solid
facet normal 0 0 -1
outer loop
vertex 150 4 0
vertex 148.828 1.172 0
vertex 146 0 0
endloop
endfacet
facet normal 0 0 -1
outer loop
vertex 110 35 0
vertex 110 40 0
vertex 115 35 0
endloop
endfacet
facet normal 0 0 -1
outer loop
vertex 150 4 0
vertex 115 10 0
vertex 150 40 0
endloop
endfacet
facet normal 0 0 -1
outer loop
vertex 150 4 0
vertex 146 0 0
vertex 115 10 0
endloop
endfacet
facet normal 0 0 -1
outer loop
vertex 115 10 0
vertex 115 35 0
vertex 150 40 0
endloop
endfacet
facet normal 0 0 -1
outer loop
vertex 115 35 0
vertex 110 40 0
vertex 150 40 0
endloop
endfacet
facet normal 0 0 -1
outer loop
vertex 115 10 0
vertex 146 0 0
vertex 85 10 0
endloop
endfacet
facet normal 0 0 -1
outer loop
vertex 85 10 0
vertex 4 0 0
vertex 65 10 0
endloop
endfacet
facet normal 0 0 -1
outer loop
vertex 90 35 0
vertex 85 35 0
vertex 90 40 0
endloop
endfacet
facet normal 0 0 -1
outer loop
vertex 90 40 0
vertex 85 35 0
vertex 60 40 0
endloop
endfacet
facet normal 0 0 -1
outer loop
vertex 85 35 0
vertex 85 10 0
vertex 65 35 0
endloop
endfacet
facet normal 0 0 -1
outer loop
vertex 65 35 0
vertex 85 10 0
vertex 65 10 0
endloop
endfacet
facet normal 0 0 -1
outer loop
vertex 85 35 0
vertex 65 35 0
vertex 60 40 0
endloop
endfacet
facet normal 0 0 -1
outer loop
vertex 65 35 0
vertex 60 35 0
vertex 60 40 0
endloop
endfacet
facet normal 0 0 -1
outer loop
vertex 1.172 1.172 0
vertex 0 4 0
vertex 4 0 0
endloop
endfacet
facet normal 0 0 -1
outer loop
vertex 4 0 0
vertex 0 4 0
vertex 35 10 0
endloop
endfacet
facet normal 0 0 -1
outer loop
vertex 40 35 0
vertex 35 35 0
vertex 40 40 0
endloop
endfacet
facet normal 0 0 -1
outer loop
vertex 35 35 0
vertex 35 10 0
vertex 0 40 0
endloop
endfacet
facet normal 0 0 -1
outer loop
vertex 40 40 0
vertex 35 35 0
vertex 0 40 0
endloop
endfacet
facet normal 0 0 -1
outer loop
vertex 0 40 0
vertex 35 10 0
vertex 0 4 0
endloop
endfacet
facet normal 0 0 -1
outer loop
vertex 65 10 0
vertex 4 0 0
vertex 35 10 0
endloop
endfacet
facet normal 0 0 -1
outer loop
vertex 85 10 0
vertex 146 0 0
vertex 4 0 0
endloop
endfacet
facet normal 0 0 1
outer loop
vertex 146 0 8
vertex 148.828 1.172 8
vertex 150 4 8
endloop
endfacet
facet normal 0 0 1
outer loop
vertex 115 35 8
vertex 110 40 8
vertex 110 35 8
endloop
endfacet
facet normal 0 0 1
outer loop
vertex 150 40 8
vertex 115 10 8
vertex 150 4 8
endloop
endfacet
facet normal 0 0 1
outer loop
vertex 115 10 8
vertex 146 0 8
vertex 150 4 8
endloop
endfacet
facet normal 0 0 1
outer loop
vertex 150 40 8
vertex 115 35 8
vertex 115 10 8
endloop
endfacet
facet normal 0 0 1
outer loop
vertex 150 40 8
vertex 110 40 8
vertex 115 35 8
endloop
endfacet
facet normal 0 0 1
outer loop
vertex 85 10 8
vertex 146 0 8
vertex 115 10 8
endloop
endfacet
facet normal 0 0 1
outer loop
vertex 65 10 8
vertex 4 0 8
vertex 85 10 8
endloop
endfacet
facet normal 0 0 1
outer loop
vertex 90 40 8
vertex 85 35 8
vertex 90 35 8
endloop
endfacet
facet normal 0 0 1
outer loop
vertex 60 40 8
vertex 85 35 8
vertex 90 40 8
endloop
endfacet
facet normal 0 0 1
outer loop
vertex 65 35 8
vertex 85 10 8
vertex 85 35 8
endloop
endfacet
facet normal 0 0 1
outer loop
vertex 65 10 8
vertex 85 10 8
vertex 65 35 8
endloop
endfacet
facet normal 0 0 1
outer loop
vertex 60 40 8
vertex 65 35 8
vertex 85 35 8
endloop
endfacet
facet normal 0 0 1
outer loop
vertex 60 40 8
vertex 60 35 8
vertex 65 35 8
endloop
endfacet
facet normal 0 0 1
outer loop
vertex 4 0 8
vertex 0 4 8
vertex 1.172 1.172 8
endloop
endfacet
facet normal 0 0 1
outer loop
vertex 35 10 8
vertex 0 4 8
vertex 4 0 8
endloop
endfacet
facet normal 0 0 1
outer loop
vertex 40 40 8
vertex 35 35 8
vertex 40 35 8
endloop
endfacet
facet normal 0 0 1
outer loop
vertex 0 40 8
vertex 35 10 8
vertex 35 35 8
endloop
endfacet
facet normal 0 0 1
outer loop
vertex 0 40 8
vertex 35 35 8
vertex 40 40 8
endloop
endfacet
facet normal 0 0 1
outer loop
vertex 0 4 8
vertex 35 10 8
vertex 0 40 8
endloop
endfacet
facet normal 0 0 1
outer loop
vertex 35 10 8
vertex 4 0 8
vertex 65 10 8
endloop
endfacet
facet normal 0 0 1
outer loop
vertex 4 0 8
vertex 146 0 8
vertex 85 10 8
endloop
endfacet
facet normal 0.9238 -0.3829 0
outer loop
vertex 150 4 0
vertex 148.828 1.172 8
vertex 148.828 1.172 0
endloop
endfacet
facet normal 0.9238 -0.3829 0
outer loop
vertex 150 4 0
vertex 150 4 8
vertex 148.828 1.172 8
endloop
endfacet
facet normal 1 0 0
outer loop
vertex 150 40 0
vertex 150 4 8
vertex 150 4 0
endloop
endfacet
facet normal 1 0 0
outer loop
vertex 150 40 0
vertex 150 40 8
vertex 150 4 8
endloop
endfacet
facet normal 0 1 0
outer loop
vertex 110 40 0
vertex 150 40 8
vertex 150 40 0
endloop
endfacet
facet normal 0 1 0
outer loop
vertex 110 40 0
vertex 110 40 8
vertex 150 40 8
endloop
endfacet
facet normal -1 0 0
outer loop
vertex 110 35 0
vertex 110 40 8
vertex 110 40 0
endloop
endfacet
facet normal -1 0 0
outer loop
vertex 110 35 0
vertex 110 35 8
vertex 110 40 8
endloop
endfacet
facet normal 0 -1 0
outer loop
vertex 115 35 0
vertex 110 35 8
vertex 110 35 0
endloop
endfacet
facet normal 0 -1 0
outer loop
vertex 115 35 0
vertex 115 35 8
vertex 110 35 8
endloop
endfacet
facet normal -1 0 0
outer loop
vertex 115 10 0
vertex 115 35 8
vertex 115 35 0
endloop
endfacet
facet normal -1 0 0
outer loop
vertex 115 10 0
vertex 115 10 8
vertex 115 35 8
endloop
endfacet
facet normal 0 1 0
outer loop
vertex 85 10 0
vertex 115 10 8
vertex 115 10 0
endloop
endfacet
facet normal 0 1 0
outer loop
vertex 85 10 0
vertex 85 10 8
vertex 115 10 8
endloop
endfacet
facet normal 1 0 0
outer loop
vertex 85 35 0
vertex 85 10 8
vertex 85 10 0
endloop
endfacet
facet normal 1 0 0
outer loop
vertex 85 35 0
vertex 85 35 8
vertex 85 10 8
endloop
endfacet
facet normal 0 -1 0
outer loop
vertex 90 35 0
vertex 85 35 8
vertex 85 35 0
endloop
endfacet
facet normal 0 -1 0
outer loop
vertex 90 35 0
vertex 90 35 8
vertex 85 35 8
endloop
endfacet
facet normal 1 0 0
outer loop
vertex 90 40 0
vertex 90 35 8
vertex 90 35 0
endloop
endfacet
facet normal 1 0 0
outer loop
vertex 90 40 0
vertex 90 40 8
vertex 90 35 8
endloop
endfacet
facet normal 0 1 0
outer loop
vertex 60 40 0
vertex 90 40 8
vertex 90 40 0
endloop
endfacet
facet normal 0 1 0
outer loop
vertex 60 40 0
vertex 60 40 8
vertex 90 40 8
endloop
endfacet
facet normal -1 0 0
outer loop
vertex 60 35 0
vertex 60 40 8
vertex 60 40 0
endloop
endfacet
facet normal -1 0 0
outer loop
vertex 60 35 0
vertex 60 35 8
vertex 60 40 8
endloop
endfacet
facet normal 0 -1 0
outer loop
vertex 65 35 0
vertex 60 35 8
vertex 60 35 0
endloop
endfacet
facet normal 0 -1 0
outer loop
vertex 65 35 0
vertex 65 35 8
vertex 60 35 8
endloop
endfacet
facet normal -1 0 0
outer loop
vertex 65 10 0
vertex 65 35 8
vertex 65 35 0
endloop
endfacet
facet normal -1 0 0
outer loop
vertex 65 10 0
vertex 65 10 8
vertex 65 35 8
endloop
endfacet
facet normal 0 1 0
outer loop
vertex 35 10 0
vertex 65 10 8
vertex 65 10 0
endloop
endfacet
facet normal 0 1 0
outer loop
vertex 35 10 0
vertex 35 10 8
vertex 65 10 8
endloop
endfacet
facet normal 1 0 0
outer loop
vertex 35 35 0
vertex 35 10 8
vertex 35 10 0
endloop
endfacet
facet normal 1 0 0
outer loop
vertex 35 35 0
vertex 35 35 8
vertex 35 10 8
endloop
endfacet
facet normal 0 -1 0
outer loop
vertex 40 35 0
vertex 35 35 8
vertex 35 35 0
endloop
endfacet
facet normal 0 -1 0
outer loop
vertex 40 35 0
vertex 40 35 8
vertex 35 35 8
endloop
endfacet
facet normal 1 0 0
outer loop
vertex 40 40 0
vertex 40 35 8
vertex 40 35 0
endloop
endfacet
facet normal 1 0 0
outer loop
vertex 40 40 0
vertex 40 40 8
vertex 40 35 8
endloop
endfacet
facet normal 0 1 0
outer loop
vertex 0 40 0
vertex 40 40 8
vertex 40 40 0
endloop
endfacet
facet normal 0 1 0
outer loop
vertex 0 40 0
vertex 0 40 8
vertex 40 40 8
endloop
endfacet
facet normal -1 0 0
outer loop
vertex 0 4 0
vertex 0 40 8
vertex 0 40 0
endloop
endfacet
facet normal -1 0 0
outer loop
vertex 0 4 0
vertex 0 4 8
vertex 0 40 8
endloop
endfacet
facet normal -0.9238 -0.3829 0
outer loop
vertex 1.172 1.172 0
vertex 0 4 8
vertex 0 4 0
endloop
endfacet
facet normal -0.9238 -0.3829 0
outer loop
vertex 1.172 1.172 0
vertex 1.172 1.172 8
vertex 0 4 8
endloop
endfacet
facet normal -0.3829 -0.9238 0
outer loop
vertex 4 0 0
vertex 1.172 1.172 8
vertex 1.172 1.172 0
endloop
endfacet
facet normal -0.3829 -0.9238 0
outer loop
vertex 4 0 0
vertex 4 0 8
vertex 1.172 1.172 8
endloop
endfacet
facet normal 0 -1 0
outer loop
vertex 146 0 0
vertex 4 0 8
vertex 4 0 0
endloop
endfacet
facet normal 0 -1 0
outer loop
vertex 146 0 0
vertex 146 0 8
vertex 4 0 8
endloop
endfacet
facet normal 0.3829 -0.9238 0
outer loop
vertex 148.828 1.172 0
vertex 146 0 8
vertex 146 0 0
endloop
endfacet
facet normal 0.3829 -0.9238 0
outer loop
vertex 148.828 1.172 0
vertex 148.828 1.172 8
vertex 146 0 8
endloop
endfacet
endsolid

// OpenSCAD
$fn = 32;

// ----------------------------------------------------------------------
// Oversize slot bar: 150 mm bar with 2 oversize windows
// ----------------------------------------------------------------------

// --- parameters (mm) ---
profile_height = 8;       // extrusion height
profile_points = 24;      // points of the closed outline

profile = [[0, 4], [1.172, 1.172], [4, 0], [146, 0], [148.828, 1.172], [150, 4], [150, 40], [110, 40], [110, 35], [115, 35], [115, 10], [85, 10], [85, 35], [90, 35], [90, 40], [60, 40], [60, 35], [65, 35], [65, 10], [35, 10], [35, 35], [40, 35], [40, 40], [0, 40]];  // single closed polygon, 24 points, counter clockwise

// --- the one profile operation ---
linear_extrude(height = profile_height) polygon(points = profile);
